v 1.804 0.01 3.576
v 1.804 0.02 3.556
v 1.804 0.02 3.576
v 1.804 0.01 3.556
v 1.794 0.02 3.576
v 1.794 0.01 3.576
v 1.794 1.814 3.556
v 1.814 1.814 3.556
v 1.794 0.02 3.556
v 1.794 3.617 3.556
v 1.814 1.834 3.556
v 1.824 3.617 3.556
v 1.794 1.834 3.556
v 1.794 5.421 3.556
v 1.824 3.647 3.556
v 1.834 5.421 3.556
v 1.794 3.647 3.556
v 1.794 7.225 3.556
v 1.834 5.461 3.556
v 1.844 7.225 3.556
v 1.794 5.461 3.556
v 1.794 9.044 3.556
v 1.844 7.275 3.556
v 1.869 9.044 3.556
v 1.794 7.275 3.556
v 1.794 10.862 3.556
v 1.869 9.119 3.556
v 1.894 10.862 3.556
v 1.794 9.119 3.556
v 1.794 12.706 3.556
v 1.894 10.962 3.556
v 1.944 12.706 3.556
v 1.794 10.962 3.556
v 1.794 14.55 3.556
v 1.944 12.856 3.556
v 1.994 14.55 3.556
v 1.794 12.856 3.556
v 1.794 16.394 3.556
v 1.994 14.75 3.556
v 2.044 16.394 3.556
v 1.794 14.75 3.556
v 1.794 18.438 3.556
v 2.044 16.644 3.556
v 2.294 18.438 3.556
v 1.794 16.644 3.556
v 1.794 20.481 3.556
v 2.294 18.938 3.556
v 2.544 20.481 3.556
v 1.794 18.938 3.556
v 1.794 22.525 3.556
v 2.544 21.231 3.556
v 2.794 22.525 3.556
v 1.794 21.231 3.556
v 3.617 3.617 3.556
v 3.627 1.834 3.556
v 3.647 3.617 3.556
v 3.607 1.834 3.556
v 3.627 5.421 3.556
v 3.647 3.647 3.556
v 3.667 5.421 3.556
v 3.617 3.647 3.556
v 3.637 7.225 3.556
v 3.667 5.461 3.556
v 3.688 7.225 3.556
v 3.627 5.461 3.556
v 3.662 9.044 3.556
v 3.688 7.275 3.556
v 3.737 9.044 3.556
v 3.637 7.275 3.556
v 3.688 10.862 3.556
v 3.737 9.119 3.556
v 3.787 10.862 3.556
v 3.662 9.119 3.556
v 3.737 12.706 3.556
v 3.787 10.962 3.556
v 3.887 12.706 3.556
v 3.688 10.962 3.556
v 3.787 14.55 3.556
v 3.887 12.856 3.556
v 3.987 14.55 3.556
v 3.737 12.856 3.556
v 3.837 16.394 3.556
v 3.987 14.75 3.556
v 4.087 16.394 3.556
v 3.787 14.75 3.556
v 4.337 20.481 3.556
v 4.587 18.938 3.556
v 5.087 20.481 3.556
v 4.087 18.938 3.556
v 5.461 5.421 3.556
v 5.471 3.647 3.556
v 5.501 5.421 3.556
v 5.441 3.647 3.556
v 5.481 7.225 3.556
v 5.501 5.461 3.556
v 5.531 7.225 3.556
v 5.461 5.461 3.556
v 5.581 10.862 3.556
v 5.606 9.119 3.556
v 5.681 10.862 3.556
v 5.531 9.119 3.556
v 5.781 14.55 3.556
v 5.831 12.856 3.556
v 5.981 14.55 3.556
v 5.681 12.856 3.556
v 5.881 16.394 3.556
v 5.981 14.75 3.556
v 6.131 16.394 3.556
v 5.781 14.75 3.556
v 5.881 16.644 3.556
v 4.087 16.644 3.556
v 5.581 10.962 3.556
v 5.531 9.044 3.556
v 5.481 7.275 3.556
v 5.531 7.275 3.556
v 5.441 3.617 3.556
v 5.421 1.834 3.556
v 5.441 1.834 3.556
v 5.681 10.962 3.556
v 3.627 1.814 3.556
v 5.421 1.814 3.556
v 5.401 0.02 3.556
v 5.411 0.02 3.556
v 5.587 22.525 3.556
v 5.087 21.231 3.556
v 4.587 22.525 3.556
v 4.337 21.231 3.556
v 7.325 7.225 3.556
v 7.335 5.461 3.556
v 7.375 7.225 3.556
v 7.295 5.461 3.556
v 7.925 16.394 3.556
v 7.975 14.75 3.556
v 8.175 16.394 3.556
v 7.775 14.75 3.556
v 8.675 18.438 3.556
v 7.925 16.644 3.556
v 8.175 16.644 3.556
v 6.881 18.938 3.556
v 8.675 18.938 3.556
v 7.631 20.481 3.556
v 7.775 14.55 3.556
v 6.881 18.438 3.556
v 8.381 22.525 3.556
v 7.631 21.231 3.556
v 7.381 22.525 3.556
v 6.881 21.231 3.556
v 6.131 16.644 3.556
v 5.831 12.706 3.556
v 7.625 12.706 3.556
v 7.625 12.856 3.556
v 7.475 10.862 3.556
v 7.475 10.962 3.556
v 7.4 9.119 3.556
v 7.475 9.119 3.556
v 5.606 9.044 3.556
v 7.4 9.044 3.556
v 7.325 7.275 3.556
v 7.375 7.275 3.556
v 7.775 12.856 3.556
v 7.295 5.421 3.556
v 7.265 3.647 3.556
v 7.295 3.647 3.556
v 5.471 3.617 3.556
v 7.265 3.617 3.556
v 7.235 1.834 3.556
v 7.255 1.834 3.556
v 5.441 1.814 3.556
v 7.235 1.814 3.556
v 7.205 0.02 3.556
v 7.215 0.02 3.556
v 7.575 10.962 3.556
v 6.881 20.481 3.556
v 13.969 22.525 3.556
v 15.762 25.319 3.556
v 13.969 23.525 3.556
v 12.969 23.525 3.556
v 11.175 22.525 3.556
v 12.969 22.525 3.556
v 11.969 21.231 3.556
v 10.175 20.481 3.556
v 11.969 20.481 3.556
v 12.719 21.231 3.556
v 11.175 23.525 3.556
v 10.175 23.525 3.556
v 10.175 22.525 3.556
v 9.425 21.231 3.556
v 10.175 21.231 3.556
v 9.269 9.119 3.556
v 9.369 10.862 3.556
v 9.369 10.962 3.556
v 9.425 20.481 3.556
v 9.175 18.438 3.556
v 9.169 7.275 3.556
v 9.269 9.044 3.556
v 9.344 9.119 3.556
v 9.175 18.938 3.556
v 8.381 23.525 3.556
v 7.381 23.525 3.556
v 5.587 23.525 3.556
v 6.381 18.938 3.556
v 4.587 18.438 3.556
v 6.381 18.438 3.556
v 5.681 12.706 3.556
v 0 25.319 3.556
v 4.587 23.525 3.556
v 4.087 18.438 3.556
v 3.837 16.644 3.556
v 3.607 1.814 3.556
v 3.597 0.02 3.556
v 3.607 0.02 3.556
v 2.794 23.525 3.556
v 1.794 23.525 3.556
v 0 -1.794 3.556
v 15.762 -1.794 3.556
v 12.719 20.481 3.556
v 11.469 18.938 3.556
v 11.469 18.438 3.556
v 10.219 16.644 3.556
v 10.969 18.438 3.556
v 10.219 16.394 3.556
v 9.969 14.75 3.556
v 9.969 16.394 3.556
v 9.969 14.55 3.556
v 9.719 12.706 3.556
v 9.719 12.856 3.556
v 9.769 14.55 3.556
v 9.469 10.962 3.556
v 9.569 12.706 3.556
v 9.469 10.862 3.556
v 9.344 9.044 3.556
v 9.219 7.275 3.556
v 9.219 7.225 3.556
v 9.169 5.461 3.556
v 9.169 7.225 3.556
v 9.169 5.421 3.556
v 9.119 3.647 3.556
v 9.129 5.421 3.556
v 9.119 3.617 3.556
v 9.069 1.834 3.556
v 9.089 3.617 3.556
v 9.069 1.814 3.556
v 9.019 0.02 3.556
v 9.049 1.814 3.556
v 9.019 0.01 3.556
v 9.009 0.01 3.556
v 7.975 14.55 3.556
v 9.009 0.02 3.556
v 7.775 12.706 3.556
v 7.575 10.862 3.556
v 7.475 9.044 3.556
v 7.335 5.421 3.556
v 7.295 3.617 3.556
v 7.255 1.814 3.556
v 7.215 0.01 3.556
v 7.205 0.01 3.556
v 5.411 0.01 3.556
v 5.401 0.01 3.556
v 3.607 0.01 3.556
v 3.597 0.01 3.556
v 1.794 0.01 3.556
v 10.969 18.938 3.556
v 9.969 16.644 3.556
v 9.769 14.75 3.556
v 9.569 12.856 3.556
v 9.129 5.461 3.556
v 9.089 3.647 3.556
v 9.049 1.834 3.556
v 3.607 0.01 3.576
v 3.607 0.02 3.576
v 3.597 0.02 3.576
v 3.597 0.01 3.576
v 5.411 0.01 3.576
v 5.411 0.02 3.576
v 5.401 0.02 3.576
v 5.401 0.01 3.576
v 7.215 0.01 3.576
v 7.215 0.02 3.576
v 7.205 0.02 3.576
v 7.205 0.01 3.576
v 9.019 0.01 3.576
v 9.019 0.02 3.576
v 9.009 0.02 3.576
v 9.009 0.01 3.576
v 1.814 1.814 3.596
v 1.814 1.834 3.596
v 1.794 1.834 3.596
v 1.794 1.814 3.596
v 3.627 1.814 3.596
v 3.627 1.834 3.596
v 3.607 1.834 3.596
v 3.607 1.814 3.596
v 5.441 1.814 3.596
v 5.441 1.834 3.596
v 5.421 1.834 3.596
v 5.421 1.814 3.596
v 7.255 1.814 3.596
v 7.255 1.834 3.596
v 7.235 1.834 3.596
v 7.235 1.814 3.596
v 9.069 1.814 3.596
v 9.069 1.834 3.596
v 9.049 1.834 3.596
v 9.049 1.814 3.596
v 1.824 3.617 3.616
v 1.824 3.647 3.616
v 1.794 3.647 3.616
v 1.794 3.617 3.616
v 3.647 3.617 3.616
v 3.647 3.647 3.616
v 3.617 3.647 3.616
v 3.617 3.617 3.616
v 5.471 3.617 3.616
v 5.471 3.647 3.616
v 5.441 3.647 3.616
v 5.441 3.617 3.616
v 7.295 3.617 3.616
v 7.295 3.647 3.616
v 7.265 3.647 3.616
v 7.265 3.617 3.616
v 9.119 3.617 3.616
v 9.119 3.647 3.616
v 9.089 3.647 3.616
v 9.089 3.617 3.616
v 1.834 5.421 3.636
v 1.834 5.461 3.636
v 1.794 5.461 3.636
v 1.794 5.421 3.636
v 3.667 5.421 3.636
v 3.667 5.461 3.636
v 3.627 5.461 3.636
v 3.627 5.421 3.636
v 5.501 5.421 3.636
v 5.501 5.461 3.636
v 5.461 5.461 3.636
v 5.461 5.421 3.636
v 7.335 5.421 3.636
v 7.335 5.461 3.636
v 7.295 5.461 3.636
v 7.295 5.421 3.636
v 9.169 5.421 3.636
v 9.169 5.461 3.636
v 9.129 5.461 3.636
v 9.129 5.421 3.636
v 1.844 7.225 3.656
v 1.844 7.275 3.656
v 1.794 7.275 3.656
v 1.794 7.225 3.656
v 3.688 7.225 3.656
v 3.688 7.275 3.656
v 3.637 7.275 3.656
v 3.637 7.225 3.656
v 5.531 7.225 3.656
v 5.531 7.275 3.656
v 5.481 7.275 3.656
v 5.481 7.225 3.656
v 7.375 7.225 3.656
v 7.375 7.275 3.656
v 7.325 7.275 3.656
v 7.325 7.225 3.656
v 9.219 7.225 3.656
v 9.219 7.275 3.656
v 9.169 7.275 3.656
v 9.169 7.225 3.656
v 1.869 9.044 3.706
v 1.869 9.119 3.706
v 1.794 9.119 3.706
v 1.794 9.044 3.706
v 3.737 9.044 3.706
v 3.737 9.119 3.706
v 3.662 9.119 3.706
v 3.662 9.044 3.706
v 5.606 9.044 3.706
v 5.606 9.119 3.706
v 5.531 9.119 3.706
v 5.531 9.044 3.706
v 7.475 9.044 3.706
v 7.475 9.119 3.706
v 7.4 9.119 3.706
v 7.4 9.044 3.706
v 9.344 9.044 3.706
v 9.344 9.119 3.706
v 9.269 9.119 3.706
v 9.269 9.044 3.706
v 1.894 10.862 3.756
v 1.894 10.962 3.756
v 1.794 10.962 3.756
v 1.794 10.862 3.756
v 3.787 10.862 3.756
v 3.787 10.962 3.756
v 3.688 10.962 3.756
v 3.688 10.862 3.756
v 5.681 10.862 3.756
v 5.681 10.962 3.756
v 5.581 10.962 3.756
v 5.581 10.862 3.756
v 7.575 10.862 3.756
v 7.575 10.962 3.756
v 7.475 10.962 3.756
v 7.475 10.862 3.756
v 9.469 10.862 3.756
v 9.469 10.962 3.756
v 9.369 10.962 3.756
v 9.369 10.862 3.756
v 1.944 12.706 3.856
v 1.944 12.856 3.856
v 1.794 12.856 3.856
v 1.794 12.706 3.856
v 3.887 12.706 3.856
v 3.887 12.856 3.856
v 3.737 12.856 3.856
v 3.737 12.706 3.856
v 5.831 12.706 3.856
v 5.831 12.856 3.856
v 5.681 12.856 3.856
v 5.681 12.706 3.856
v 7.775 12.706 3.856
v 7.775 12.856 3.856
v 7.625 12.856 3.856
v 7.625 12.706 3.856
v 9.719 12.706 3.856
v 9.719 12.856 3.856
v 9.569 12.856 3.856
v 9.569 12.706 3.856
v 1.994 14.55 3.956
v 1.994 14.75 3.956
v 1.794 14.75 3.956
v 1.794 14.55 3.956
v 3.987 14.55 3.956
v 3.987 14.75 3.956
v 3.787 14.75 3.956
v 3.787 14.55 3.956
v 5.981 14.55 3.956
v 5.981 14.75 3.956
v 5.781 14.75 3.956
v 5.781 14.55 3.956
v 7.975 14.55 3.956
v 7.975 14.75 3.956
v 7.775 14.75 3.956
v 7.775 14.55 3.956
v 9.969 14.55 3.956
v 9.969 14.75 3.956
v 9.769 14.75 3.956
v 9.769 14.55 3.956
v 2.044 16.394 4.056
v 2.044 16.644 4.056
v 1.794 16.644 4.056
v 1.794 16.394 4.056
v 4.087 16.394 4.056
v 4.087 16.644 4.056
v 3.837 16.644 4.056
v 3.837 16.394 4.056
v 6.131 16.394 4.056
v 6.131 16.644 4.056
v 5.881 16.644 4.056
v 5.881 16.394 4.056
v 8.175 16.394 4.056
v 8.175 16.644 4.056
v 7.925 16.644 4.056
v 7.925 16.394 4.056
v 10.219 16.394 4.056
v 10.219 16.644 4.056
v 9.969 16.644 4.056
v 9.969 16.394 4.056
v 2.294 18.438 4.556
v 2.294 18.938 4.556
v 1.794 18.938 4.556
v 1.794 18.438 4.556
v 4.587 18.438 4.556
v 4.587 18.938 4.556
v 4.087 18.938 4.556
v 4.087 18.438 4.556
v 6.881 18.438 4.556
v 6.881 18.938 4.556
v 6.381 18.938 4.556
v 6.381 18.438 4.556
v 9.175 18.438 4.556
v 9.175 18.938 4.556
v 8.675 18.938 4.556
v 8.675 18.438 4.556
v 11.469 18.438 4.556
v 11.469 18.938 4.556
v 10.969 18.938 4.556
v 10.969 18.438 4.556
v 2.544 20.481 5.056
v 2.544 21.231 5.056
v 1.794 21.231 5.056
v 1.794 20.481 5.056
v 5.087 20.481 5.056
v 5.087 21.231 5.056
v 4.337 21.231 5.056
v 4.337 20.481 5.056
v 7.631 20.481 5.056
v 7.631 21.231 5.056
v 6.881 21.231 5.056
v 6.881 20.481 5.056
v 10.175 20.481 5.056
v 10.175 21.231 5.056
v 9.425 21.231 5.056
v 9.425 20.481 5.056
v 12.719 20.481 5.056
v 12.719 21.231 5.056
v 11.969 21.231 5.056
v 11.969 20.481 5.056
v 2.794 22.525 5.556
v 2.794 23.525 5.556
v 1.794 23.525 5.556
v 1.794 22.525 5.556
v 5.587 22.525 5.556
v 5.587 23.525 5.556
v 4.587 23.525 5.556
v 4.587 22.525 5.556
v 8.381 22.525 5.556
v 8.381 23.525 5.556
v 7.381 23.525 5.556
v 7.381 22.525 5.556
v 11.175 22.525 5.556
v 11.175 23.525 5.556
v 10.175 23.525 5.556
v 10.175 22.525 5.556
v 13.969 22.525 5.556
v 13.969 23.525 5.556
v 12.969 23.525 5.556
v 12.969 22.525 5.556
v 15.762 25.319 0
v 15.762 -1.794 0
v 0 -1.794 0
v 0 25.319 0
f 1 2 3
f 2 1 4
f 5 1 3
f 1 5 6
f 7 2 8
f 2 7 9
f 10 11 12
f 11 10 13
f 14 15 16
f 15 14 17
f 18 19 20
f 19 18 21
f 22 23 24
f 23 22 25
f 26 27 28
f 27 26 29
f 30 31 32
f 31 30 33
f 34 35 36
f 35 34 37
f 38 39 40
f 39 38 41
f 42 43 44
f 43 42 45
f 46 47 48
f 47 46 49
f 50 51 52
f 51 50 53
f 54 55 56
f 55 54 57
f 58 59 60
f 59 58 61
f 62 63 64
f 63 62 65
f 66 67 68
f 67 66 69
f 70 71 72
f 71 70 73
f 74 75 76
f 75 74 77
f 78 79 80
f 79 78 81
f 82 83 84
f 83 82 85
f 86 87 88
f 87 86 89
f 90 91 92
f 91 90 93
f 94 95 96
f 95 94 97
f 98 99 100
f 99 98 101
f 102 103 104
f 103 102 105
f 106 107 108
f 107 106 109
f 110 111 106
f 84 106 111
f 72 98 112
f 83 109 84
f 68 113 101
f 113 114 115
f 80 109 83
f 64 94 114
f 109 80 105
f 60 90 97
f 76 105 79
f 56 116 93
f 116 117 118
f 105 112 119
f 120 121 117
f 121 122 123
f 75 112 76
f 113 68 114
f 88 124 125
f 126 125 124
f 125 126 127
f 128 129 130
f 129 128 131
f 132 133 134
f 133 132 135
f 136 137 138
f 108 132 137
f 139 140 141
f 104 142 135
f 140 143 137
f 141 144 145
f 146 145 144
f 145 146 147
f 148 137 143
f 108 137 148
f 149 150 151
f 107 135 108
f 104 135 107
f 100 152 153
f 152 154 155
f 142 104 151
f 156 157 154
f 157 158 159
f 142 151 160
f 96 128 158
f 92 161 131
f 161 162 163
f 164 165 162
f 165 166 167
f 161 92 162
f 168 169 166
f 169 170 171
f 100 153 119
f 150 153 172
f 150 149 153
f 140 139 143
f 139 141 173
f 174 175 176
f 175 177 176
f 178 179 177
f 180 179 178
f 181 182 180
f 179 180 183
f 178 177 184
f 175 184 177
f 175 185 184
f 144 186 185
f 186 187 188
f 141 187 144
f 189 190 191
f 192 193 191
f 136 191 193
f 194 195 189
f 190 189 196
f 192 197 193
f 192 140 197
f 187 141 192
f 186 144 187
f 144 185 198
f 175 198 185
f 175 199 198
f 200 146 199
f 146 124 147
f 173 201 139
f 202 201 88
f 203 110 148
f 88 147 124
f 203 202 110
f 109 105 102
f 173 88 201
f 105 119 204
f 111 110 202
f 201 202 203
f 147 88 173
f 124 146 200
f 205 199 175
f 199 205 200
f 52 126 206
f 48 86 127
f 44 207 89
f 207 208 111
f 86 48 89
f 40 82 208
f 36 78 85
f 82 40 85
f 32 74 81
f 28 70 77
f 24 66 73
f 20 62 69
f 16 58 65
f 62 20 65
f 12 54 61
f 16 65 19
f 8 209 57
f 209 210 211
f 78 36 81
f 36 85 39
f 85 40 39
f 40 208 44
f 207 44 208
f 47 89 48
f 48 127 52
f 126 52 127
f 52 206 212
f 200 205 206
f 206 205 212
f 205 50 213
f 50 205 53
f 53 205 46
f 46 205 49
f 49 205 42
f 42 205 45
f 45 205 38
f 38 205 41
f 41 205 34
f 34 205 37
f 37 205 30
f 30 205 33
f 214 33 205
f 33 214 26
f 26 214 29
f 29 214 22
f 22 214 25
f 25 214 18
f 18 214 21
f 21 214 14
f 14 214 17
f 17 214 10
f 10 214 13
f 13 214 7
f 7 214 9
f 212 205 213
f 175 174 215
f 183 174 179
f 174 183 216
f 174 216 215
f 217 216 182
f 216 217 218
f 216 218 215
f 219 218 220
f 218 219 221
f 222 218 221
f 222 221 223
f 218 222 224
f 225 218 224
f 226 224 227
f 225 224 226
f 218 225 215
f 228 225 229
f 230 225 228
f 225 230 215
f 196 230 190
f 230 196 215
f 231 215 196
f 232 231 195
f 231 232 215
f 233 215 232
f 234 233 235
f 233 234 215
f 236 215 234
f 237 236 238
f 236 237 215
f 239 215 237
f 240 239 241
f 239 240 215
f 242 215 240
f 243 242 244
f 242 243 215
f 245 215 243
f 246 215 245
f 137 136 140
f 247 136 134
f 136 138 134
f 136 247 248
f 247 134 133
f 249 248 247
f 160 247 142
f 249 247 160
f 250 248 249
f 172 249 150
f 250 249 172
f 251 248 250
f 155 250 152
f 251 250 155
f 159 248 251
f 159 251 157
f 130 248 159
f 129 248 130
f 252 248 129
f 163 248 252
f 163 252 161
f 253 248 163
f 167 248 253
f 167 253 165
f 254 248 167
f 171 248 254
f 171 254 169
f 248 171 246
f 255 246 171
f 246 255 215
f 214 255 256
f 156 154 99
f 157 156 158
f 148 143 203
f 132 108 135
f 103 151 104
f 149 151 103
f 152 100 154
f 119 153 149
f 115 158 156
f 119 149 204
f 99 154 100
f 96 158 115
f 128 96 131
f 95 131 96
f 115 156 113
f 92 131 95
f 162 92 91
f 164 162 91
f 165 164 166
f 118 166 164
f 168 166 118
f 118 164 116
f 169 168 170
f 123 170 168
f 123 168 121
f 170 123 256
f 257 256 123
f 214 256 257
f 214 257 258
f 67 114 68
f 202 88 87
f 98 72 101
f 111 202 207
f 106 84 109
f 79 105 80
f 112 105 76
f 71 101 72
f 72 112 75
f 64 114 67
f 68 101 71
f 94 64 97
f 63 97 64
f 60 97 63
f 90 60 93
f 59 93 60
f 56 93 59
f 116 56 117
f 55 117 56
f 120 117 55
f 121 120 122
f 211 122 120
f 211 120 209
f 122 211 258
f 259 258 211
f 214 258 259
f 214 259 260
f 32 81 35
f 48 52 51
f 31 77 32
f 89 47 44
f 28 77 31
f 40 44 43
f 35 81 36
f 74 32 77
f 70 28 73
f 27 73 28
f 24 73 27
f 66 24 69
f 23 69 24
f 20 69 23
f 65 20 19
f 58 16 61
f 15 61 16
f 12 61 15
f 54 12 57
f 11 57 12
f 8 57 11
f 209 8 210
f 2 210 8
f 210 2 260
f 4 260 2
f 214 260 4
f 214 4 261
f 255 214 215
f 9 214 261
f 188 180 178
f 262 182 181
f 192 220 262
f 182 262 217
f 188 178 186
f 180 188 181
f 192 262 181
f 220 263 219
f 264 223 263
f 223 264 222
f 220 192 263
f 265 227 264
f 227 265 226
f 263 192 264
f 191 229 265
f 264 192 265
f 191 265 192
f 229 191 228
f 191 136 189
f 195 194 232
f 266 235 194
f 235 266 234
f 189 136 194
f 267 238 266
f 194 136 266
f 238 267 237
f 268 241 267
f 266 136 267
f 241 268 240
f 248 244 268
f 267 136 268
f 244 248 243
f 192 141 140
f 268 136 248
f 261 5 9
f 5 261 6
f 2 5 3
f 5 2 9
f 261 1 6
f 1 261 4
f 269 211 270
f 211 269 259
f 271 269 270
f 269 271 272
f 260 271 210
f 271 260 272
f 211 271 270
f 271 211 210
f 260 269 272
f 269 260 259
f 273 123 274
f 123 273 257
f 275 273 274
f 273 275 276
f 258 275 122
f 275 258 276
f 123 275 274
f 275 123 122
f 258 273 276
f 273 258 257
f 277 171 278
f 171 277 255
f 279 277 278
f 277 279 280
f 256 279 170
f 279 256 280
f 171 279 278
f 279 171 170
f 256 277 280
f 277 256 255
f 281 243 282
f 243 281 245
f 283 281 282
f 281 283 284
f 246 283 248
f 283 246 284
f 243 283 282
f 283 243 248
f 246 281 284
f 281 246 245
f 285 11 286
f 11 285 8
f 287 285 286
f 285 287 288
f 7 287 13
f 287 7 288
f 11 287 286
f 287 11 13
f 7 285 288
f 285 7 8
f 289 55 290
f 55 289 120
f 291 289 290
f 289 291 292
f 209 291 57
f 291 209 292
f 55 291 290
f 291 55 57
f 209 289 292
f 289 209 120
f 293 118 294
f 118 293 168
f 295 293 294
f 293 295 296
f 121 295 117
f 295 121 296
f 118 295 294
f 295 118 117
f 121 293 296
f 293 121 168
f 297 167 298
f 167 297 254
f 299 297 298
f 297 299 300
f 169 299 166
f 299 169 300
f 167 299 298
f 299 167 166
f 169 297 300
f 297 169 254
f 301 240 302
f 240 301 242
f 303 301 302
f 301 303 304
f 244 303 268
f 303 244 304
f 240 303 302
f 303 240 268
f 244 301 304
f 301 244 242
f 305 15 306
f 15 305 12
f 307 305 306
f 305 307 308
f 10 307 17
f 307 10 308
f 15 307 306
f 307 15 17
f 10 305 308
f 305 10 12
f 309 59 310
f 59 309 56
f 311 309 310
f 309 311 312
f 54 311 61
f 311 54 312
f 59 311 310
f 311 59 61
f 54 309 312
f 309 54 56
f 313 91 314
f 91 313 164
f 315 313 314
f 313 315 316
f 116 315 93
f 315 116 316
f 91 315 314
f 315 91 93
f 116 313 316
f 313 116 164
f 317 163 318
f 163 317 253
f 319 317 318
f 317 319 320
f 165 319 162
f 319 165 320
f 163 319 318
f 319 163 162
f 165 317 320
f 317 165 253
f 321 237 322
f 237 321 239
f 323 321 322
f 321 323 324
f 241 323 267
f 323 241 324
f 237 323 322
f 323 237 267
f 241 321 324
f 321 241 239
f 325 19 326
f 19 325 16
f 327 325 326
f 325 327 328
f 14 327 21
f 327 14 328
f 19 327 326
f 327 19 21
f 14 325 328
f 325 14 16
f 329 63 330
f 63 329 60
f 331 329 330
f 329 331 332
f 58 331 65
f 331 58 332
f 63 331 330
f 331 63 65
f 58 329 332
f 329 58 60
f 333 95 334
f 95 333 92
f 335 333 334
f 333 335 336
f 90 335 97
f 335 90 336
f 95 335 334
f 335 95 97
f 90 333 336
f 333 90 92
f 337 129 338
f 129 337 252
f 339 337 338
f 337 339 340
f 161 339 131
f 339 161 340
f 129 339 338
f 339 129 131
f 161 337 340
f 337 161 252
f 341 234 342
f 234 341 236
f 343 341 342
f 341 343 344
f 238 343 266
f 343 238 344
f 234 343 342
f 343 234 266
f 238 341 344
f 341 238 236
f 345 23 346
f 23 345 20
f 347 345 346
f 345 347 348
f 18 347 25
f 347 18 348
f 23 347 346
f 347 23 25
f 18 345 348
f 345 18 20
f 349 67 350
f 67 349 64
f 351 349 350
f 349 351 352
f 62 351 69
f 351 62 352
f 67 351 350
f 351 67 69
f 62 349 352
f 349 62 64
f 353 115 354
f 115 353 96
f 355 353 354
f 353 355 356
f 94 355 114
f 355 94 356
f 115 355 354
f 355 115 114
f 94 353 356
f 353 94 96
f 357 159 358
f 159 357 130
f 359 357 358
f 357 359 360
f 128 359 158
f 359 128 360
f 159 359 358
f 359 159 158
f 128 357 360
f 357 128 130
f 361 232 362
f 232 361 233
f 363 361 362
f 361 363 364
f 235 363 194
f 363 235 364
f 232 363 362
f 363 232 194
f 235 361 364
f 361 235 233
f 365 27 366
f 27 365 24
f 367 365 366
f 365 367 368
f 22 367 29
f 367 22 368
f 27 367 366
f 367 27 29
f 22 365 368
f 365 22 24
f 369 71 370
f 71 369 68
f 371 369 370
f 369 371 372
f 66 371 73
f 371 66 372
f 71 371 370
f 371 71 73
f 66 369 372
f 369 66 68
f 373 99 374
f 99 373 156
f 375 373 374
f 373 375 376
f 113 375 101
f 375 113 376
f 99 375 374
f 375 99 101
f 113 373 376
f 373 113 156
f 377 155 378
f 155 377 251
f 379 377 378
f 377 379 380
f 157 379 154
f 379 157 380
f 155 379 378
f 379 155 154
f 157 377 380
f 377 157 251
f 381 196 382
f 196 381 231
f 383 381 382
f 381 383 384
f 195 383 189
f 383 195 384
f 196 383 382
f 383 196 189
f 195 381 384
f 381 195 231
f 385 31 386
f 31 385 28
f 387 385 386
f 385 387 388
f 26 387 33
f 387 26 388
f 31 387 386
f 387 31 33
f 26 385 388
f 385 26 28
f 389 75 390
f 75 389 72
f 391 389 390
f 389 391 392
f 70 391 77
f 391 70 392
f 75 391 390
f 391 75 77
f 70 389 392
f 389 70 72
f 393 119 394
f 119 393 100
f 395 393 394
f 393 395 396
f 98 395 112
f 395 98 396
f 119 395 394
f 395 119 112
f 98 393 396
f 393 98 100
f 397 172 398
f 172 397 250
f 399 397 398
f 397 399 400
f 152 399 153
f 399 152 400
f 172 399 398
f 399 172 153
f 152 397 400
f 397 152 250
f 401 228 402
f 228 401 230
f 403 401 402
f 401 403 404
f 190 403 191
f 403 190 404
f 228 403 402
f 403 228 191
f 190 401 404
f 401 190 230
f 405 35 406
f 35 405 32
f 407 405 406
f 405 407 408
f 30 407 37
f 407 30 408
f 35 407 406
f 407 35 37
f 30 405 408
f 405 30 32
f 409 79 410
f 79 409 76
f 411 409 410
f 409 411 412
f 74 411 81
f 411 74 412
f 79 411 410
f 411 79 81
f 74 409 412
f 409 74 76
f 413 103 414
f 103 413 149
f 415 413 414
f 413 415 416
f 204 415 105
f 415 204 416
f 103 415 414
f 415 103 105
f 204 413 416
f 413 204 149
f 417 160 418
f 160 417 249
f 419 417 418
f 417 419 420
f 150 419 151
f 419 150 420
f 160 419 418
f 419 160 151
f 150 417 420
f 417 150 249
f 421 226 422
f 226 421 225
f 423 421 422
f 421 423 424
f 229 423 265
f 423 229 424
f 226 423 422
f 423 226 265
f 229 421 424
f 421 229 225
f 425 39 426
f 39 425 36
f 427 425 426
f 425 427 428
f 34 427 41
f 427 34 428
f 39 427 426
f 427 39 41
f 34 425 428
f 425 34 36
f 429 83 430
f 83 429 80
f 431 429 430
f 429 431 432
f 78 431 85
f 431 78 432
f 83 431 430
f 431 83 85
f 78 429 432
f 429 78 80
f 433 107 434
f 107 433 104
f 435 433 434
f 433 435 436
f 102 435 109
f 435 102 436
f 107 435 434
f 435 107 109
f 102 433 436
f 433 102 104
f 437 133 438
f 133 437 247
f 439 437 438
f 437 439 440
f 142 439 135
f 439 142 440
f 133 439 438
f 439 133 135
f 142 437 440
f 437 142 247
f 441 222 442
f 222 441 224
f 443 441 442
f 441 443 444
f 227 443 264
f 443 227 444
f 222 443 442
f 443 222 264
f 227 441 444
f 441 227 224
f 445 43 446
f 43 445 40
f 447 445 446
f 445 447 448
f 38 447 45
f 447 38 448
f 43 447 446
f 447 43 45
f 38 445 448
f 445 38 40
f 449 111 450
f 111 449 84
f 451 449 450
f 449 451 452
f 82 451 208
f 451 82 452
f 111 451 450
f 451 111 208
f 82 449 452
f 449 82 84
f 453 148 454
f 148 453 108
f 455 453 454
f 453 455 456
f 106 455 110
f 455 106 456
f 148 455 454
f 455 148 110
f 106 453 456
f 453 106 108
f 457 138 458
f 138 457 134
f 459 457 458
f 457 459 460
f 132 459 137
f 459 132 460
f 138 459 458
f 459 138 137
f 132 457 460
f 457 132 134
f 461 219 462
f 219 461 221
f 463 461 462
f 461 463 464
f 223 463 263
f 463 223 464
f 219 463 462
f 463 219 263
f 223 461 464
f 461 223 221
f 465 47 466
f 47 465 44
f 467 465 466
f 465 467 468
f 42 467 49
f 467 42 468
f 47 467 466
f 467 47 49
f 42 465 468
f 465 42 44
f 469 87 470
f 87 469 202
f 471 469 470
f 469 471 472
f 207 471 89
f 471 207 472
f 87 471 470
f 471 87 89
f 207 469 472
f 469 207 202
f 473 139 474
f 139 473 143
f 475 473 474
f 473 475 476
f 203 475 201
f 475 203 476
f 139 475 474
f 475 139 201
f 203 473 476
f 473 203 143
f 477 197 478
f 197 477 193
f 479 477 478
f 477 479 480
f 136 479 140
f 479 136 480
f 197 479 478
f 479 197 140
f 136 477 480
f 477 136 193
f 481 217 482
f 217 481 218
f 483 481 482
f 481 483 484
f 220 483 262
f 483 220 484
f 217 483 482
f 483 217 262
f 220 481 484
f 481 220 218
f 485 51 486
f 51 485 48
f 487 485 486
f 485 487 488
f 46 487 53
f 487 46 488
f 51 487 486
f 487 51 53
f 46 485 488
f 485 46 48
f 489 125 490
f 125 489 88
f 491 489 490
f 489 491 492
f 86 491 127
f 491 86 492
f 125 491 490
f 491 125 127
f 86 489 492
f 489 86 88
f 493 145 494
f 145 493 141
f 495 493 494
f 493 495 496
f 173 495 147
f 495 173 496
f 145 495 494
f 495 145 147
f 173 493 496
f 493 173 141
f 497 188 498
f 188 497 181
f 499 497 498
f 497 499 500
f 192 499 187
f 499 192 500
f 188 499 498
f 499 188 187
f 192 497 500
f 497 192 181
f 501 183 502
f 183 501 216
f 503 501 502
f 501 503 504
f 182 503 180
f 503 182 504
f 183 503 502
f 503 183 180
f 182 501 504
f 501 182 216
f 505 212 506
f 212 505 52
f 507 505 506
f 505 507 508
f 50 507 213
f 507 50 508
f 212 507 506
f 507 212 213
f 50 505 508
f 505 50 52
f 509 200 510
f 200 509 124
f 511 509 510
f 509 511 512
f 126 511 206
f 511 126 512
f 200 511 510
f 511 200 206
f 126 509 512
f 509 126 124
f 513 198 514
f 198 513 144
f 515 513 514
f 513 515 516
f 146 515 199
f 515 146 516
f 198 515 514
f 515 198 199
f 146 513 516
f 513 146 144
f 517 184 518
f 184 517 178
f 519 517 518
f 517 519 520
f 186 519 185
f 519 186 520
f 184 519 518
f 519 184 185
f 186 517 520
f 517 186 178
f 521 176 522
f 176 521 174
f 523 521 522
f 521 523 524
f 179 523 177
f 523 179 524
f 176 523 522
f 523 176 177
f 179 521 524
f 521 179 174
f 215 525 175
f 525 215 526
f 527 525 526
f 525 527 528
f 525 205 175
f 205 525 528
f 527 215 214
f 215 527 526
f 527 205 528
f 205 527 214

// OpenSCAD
//Parameters
  //Number of technical replicates
  numReplications = 5;	
  //Cube sizes to test
  cubeSize = [0.01, 0.02, 0.03, 0.04, 0.05, 0.075, 0.1, 0.15, 0.2, 0.25, 0.5, 0.75, 1];
  //End mill diameter 
  endMillD = 0.79375;  //1/32"
  aspectRatio = 2;     //Aspect ratio of test cube
  stockZ = 5.556;

//Maths
  //Add 1mm to end mill diameter to space out replicates
  CubeZ = max(cubeSize)*aspectRatio;
  Spacing = endMillD + 1;
  StockX = ((max(cubeSize)+Spacing)*numReplications);
  StockZ = stockZ - CubeZ; 
  NumOfCubeSizes = len(cubeSize);
  
//uncomment to render
XYTestDevice();

//Module Definition
module XYTestDevice(){
  //Draw stock
  hull(){
    translate([0,-Spacing,0])cube([Spacing+StockX,Spacing,StockZ], center=false);
    for(i = [0 : len(cubeSize)-1]){
      let (YLocation = cubeSize[i]+i*Spacing){
	for (j = [0: numReplications-1]){
	  if (i==len(cubeSize)-1)translate([0,YLocation,0])cube([1,Spacing+cubeSize[i],StockZ], center=false);
	  translate([Spacing+(j*(cubeSize[i]+Spacing)),YLocation,0]){
	    cube([Spacing+cubeSize[i], Spacing+cubeSize[i], StockZ], center=false);
	  }
	}
      }
    }
  }

  //Make test structures 
  for(i = [0 : len(cubeSize)-1]){
    let (YLocation = cubeSize[i]+i*Spacing){
      for (j = [0: numReplications-1]){
        translate([Spacing+(j*(cubeSize[i]+Spacing)),YLocation,StockZ]){
          cube([cubeSize[i], cubeSize[i], cubeSize[i]*aspectRatio], center=false);
        }
      }
    }
  }
}
